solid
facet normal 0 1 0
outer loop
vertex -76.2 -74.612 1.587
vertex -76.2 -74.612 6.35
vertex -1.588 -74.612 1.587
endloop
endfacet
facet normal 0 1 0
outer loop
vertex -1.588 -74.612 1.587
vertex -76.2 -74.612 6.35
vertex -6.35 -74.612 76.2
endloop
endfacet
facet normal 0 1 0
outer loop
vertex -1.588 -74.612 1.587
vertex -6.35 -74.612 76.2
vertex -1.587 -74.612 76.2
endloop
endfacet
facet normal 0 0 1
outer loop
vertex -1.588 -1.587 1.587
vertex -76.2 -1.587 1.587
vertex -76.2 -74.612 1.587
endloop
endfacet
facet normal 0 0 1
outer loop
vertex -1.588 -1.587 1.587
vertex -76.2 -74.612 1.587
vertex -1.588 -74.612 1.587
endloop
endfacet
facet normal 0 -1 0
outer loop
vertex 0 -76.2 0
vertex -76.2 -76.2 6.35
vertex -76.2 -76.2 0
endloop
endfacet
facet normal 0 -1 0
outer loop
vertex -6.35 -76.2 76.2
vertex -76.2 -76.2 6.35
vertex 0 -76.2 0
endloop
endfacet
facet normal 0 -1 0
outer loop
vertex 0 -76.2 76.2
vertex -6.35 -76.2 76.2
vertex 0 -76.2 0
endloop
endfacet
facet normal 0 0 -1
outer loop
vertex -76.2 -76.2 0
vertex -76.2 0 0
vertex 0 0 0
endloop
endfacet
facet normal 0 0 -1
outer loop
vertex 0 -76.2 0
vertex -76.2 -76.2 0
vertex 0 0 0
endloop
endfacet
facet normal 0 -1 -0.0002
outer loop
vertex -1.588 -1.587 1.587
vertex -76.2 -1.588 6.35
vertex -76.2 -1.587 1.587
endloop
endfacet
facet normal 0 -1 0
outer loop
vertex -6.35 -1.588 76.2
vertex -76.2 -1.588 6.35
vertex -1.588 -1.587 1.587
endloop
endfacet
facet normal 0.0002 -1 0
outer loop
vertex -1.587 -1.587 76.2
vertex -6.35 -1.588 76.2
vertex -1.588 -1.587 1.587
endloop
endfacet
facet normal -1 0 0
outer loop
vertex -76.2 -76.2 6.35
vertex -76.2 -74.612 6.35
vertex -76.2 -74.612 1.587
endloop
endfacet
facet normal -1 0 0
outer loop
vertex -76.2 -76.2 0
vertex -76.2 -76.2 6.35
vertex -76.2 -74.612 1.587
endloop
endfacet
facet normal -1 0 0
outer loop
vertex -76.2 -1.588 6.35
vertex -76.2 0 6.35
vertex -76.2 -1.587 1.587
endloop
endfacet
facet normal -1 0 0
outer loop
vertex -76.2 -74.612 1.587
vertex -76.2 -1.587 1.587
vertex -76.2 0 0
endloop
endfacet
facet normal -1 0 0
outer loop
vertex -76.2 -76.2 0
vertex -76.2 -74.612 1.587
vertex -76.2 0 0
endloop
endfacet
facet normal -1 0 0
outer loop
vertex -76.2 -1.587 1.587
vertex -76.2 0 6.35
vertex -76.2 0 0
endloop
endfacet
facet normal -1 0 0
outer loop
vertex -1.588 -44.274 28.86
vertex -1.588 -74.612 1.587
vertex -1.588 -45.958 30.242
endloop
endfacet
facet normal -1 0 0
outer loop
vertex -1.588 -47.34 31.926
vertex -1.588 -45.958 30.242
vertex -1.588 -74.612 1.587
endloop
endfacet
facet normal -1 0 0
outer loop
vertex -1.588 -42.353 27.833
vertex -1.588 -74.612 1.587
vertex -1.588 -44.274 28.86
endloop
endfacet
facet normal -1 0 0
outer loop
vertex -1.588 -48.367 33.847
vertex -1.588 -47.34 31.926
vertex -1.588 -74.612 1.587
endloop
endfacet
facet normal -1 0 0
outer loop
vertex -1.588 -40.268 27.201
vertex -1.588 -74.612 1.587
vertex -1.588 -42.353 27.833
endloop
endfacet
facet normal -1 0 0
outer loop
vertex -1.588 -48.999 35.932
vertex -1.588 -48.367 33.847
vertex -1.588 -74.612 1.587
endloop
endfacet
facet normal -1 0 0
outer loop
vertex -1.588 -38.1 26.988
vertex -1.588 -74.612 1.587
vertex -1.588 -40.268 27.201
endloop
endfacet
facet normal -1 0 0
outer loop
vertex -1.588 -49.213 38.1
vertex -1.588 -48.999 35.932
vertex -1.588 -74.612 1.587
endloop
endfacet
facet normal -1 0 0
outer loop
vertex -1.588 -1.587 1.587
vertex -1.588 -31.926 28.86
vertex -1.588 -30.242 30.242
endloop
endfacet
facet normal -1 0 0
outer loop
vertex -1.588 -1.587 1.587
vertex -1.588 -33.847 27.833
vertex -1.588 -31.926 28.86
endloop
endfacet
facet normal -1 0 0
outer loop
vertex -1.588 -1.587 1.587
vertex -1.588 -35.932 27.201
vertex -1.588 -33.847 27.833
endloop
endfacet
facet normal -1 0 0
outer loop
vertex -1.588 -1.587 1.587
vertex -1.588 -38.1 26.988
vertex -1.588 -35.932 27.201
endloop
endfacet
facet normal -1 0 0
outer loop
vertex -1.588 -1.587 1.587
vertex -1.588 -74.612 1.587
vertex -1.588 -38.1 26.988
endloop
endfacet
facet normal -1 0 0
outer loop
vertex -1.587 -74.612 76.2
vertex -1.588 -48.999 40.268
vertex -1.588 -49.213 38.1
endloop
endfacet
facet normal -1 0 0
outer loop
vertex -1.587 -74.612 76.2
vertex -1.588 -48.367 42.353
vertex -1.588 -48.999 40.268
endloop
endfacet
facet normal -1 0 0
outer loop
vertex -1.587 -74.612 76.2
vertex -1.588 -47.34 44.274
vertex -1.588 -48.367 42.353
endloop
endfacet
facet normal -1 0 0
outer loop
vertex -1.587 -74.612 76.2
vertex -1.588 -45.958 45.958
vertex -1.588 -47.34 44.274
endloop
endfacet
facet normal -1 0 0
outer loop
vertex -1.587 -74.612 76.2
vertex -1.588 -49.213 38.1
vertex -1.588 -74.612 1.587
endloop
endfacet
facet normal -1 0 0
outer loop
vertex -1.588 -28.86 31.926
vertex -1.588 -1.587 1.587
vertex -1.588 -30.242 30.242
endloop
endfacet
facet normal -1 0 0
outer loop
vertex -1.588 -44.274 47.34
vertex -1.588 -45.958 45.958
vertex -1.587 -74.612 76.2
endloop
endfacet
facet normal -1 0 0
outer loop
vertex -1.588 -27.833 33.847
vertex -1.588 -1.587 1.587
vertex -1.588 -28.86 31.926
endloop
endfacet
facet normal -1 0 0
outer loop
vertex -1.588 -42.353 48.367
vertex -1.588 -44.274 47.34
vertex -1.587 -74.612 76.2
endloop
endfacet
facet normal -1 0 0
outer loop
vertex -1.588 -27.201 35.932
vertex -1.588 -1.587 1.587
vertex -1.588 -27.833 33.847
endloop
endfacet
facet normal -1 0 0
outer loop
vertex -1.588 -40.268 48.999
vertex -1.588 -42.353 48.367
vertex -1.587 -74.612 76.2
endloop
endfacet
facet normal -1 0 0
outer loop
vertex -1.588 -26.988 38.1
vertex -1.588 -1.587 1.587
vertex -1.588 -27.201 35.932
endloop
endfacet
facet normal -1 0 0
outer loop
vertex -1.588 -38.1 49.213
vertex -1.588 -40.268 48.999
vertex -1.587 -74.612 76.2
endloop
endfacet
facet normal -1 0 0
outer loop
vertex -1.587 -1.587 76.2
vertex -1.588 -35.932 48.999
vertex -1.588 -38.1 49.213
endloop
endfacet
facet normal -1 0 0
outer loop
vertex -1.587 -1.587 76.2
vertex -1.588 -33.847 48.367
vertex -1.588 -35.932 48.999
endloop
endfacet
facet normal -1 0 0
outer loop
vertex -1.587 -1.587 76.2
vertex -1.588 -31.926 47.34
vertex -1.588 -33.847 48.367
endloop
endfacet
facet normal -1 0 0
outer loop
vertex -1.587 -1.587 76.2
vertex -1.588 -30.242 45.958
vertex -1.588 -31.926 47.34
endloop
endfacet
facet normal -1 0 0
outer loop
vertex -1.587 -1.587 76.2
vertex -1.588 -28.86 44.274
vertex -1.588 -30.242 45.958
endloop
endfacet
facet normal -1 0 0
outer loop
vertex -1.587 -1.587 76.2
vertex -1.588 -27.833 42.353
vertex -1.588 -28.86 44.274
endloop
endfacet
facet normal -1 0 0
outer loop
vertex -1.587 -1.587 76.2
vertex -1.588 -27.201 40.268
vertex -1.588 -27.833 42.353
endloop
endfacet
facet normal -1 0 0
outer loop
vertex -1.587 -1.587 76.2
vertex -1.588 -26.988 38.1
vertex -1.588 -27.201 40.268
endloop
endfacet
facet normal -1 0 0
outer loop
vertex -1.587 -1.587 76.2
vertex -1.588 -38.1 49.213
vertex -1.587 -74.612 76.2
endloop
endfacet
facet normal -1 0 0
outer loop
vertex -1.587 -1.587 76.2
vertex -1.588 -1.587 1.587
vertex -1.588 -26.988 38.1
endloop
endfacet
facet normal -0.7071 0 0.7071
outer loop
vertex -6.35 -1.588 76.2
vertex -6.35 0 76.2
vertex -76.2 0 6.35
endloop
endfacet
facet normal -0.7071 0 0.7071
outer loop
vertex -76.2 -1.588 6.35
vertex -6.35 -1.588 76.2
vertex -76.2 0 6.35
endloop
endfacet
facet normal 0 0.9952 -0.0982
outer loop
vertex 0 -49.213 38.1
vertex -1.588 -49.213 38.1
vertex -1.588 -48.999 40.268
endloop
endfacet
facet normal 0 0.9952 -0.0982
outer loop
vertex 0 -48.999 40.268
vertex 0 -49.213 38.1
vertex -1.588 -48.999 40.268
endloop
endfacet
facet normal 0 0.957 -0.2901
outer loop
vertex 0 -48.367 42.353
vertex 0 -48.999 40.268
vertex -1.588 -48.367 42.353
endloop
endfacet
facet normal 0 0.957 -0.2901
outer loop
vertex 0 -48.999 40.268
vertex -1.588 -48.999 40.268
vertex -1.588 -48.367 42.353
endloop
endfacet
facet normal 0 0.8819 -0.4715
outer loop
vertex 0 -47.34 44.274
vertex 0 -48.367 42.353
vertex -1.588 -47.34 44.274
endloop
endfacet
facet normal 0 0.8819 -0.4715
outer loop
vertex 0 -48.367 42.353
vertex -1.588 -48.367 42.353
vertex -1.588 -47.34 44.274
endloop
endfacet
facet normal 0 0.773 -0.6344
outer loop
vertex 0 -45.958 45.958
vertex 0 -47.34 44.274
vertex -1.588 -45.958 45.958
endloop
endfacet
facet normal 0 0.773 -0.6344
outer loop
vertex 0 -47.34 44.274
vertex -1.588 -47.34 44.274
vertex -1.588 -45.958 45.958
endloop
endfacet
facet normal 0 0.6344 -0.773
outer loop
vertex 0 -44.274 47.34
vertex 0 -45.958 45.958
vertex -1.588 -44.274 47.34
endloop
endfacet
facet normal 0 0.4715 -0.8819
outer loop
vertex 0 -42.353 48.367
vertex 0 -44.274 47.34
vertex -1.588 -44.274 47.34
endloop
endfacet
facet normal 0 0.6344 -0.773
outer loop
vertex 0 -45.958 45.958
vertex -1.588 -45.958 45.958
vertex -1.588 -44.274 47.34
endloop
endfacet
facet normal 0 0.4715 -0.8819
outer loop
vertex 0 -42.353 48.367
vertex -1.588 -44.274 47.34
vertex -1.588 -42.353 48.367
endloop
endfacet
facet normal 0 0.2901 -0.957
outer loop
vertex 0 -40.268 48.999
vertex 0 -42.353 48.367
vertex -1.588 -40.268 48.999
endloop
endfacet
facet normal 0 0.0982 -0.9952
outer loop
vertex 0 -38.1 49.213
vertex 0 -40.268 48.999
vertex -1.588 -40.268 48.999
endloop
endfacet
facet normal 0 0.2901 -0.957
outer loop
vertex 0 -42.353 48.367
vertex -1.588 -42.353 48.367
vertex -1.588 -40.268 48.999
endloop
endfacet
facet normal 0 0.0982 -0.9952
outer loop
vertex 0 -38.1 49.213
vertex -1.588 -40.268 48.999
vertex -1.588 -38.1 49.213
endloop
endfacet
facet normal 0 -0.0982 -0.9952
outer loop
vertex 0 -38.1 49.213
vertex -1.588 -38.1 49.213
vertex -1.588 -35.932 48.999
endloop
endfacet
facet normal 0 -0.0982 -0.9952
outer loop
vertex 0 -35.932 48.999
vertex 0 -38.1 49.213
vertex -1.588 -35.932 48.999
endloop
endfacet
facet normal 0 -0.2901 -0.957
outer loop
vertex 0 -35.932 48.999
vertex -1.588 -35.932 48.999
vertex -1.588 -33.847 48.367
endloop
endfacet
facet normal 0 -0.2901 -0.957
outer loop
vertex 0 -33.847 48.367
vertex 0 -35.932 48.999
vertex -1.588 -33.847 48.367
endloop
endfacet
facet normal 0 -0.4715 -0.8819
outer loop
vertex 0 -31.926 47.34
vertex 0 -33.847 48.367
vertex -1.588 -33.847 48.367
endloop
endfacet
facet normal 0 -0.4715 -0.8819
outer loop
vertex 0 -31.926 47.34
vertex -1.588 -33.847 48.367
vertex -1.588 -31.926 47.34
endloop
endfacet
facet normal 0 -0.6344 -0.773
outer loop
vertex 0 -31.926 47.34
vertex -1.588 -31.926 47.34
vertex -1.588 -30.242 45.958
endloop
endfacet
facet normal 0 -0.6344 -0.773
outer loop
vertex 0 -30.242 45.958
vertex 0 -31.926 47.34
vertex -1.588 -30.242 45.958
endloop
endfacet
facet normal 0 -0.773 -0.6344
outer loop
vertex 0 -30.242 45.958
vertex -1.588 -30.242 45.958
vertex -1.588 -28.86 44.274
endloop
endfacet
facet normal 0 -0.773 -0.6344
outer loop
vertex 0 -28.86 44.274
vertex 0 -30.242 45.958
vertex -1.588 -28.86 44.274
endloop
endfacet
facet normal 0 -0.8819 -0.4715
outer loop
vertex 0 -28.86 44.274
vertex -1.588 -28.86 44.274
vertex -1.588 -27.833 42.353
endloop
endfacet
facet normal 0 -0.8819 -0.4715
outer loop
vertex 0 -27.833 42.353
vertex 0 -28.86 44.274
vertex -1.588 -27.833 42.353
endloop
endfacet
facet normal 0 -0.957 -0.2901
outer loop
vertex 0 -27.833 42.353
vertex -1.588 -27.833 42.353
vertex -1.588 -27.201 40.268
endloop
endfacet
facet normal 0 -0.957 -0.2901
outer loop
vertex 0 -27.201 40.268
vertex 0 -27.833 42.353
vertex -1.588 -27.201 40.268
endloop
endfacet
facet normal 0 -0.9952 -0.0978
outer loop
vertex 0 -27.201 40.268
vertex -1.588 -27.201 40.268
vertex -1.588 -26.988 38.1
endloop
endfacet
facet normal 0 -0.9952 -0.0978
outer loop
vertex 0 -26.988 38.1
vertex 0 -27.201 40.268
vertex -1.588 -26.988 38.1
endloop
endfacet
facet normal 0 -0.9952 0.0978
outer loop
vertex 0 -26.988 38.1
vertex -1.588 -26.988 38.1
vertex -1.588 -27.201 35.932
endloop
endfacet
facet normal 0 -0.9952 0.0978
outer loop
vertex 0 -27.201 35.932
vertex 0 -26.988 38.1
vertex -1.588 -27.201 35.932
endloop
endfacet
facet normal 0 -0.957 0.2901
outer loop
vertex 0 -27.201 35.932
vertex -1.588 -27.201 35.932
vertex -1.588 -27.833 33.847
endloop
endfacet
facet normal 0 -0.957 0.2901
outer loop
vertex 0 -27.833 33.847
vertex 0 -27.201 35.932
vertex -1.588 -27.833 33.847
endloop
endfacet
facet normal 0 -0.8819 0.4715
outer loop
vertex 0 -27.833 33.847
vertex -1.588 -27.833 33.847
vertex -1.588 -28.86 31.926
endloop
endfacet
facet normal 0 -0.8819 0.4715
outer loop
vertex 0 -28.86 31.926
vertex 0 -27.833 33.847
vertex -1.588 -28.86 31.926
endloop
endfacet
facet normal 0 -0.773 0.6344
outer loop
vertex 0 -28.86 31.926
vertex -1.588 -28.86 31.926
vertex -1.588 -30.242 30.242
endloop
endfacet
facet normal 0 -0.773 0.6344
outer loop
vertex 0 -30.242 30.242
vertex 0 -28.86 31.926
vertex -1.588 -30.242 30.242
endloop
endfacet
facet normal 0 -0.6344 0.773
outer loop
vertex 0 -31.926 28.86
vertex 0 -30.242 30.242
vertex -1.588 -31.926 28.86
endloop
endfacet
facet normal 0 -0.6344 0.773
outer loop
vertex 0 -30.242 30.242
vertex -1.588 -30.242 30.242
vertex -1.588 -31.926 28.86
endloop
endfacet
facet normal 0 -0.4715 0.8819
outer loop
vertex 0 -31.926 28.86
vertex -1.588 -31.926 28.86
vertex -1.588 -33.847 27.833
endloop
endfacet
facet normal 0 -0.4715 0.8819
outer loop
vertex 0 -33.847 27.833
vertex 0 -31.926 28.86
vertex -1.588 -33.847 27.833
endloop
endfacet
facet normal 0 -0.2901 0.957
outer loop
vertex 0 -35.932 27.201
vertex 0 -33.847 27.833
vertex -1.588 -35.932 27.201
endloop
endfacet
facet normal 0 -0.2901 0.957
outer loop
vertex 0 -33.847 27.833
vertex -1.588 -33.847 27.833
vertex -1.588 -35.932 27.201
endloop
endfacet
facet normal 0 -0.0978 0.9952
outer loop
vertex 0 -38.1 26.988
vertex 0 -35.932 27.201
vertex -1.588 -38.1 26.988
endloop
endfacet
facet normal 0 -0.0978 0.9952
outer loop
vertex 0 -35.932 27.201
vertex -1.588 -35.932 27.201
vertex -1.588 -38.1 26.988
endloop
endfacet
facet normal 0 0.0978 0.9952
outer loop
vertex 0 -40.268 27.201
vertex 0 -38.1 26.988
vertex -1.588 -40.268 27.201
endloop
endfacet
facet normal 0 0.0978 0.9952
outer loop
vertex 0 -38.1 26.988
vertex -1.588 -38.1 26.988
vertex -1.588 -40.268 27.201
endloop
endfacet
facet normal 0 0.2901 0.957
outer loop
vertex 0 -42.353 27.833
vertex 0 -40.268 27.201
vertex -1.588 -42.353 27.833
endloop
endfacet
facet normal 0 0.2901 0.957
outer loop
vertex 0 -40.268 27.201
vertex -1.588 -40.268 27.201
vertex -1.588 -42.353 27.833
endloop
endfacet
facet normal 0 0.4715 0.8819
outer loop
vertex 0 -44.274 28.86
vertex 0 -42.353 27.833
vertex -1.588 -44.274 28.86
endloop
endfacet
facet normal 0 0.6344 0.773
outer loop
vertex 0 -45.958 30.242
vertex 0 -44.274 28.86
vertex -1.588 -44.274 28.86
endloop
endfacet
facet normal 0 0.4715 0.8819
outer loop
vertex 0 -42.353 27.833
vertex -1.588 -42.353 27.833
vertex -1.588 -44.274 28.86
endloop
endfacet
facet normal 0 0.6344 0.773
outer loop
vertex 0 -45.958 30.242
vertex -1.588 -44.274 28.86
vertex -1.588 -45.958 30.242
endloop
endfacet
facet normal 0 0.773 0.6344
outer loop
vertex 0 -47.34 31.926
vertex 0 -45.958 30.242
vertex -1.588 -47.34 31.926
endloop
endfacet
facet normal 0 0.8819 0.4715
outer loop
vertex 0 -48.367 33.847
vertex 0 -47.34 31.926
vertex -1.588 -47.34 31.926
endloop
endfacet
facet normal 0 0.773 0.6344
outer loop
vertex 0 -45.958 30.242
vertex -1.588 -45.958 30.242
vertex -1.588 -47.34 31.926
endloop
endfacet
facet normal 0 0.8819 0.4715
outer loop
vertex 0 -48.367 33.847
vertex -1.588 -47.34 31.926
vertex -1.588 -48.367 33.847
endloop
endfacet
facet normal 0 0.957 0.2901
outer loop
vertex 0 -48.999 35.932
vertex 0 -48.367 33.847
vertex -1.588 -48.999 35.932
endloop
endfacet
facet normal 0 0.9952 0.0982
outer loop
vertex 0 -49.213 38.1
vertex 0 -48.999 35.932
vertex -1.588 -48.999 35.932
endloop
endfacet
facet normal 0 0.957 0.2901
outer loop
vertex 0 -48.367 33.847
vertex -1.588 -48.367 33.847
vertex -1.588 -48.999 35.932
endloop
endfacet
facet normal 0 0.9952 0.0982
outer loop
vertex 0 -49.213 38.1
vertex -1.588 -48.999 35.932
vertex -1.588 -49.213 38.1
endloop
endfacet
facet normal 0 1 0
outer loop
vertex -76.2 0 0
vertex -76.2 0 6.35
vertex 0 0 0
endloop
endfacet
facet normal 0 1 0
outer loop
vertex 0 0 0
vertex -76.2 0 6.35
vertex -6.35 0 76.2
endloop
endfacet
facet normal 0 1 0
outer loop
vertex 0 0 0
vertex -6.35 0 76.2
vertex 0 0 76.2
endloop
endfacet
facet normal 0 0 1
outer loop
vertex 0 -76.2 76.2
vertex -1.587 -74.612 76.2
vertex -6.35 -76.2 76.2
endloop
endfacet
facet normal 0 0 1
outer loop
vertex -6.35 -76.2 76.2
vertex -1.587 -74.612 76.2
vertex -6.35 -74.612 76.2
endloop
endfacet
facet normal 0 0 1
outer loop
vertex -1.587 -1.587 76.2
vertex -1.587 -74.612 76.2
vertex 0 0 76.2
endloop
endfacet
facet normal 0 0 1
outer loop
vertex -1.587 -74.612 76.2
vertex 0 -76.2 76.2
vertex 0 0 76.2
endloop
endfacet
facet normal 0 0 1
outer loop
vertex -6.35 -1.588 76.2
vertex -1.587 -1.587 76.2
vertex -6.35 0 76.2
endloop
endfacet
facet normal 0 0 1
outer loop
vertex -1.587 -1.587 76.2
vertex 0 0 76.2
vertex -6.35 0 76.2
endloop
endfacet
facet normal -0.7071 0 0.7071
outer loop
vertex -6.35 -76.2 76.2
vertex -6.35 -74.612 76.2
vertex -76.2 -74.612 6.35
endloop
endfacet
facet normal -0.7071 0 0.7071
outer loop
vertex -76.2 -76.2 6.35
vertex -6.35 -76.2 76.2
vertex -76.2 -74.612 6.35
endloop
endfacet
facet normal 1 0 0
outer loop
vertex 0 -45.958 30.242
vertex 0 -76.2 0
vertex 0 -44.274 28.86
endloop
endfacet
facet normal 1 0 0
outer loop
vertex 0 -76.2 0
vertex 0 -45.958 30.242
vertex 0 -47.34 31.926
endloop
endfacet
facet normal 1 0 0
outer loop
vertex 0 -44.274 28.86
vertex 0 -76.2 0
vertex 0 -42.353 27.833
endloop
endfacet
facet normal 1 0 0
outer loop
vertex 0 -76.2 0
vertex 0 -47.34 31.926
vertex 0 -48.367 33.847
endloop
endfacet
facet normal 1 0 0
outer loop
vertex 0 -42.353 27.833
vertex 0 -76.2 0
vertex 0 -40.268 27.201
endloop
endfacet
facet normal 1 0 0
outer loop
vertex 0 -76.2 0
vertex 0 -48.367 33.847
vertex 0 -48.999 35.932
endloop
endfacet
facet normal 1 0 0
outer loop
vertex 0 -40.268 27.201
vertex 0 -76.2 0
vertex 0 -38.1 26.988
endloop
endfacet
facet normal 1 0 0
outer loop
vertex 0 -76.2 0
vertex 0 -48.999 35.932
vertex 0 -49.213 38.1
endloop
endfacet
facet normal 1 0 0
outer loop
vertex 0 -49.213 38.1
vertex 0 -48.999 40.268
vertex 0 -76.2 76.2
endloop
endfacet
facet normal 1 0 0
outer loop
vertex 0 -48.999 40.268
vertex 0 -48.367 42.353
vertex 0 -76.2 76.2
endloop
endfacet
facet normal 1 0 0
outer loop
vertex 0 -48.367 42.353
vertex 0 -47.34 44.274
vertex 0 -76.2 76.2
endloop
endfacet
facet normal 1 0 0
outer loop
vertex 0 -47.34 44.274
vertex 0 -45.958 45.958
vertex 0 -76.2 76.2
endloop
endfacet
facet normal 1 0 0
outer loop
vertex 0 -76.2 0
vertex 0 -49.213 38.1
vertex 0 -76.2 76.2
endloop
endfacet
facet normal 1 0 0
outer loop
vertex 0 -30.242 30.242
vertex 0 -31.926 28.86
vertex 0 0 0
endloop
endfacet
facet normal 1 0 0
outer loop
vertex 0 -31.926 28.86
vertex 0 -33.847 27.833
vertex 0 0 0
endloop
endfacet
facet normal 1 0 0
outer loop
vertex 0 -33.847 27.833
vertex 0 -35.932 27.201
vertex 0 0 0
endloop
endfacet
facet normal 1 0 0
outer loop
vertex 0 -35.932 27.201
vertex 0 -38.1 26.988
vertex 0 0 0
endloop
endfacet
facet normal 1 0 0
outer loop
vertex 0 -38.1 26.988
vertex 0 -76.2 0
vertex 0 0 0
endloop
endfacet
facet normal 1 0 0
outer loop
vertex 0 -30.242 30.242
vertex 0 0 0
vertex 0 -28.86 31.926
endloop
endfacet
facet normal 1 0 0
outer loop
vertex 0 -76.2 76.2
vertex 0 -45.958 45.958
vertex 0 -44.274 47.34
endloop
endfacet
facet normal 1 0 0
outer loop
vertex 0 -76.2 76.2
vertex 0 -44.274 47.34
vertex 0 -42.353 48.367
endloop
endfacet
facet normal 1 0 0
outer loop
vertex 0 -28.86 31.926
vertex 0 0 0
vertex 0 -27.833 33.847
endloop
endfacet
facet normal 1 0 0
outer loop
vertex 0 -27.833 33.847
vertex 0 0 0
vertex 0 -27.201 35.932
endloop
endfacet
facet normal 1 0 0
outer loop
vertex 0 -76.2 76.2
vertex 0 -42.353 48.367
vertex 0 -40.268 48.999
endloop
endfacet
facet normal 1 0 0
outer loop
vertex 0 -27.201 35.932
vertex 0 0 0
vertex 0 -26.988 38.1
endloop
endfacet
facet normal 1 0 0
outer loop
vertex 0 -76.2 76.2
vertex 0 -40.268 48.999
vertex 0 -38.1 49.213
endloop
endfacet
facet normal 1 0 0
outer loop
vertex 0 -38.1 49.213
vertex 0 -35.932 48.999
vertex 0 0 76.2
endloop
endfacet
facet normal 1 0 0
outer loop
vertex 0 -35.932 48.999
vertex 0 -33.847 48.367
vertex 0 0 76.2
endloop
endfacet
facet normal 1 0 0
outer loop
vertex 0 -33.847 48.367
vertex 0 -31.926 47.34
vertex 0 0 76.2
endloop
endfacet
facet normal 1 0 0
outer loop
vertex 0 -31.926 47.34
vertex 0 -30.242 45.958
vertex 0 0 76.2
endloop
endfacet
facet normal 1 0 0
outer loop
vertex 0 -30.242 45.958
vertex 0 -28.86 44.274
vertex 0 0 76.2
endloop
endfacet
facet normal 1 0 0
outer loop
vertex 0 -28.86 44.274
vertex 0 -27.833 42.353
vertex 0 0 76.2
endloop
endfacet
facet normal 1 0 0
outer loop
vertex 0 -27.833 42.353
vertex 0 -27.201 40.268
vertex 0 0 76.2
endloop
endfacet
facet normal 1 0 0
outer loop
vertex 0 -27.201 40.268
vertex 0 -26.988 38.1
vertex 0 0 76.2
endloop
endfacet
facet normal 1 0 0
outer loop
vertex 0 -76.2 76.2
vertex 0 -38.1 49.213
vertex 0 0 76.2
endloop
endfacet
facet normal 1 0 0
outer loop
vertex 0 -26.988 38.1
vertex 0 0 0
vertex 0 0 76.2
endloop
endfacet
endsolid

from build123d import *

# Parameters (mm, degrees)
F1_DEPTH = 76.2
F2_T     = -1.5875
F3_R     = 11.1125
F4_DEPTH = 1.5885


with BuildPart() as f1:
    # F0 (on Front) → F1 (new body)
    with BuildSketch(Plane.XZ):
        Polygon((-76.2, 0), (0, 0), (0, 76.2), (-6.35, 76.2), (-76.2, 6.35), align=None)
    extrude(amount=F1_DEPTH)

    # F2
    f2_openings = [f1.faces().sort_by_distance(p)[0] for p in [
        (-41.275, -38.1, 41.275),
        (-76.2, -38.1, 3.175),
        (-3.175, -38.1, 76.2),
    ]]
    offset(amount=F2_T, openings=f2_openings)

    # F3 (on face) → F4 (cut, through all)
    with BuildSketch(Plane(origin=(-1.5875, 0, 0), x_dir=(0, -1, 0), z_dir=(-1, 0, 0))):
        with Locations((38.1, 38.1)):
            Circle(F3_R)
    extrude(amount=-F4_DEPTH, mode=Mode.SUBTRACT)


solid = f1.part
